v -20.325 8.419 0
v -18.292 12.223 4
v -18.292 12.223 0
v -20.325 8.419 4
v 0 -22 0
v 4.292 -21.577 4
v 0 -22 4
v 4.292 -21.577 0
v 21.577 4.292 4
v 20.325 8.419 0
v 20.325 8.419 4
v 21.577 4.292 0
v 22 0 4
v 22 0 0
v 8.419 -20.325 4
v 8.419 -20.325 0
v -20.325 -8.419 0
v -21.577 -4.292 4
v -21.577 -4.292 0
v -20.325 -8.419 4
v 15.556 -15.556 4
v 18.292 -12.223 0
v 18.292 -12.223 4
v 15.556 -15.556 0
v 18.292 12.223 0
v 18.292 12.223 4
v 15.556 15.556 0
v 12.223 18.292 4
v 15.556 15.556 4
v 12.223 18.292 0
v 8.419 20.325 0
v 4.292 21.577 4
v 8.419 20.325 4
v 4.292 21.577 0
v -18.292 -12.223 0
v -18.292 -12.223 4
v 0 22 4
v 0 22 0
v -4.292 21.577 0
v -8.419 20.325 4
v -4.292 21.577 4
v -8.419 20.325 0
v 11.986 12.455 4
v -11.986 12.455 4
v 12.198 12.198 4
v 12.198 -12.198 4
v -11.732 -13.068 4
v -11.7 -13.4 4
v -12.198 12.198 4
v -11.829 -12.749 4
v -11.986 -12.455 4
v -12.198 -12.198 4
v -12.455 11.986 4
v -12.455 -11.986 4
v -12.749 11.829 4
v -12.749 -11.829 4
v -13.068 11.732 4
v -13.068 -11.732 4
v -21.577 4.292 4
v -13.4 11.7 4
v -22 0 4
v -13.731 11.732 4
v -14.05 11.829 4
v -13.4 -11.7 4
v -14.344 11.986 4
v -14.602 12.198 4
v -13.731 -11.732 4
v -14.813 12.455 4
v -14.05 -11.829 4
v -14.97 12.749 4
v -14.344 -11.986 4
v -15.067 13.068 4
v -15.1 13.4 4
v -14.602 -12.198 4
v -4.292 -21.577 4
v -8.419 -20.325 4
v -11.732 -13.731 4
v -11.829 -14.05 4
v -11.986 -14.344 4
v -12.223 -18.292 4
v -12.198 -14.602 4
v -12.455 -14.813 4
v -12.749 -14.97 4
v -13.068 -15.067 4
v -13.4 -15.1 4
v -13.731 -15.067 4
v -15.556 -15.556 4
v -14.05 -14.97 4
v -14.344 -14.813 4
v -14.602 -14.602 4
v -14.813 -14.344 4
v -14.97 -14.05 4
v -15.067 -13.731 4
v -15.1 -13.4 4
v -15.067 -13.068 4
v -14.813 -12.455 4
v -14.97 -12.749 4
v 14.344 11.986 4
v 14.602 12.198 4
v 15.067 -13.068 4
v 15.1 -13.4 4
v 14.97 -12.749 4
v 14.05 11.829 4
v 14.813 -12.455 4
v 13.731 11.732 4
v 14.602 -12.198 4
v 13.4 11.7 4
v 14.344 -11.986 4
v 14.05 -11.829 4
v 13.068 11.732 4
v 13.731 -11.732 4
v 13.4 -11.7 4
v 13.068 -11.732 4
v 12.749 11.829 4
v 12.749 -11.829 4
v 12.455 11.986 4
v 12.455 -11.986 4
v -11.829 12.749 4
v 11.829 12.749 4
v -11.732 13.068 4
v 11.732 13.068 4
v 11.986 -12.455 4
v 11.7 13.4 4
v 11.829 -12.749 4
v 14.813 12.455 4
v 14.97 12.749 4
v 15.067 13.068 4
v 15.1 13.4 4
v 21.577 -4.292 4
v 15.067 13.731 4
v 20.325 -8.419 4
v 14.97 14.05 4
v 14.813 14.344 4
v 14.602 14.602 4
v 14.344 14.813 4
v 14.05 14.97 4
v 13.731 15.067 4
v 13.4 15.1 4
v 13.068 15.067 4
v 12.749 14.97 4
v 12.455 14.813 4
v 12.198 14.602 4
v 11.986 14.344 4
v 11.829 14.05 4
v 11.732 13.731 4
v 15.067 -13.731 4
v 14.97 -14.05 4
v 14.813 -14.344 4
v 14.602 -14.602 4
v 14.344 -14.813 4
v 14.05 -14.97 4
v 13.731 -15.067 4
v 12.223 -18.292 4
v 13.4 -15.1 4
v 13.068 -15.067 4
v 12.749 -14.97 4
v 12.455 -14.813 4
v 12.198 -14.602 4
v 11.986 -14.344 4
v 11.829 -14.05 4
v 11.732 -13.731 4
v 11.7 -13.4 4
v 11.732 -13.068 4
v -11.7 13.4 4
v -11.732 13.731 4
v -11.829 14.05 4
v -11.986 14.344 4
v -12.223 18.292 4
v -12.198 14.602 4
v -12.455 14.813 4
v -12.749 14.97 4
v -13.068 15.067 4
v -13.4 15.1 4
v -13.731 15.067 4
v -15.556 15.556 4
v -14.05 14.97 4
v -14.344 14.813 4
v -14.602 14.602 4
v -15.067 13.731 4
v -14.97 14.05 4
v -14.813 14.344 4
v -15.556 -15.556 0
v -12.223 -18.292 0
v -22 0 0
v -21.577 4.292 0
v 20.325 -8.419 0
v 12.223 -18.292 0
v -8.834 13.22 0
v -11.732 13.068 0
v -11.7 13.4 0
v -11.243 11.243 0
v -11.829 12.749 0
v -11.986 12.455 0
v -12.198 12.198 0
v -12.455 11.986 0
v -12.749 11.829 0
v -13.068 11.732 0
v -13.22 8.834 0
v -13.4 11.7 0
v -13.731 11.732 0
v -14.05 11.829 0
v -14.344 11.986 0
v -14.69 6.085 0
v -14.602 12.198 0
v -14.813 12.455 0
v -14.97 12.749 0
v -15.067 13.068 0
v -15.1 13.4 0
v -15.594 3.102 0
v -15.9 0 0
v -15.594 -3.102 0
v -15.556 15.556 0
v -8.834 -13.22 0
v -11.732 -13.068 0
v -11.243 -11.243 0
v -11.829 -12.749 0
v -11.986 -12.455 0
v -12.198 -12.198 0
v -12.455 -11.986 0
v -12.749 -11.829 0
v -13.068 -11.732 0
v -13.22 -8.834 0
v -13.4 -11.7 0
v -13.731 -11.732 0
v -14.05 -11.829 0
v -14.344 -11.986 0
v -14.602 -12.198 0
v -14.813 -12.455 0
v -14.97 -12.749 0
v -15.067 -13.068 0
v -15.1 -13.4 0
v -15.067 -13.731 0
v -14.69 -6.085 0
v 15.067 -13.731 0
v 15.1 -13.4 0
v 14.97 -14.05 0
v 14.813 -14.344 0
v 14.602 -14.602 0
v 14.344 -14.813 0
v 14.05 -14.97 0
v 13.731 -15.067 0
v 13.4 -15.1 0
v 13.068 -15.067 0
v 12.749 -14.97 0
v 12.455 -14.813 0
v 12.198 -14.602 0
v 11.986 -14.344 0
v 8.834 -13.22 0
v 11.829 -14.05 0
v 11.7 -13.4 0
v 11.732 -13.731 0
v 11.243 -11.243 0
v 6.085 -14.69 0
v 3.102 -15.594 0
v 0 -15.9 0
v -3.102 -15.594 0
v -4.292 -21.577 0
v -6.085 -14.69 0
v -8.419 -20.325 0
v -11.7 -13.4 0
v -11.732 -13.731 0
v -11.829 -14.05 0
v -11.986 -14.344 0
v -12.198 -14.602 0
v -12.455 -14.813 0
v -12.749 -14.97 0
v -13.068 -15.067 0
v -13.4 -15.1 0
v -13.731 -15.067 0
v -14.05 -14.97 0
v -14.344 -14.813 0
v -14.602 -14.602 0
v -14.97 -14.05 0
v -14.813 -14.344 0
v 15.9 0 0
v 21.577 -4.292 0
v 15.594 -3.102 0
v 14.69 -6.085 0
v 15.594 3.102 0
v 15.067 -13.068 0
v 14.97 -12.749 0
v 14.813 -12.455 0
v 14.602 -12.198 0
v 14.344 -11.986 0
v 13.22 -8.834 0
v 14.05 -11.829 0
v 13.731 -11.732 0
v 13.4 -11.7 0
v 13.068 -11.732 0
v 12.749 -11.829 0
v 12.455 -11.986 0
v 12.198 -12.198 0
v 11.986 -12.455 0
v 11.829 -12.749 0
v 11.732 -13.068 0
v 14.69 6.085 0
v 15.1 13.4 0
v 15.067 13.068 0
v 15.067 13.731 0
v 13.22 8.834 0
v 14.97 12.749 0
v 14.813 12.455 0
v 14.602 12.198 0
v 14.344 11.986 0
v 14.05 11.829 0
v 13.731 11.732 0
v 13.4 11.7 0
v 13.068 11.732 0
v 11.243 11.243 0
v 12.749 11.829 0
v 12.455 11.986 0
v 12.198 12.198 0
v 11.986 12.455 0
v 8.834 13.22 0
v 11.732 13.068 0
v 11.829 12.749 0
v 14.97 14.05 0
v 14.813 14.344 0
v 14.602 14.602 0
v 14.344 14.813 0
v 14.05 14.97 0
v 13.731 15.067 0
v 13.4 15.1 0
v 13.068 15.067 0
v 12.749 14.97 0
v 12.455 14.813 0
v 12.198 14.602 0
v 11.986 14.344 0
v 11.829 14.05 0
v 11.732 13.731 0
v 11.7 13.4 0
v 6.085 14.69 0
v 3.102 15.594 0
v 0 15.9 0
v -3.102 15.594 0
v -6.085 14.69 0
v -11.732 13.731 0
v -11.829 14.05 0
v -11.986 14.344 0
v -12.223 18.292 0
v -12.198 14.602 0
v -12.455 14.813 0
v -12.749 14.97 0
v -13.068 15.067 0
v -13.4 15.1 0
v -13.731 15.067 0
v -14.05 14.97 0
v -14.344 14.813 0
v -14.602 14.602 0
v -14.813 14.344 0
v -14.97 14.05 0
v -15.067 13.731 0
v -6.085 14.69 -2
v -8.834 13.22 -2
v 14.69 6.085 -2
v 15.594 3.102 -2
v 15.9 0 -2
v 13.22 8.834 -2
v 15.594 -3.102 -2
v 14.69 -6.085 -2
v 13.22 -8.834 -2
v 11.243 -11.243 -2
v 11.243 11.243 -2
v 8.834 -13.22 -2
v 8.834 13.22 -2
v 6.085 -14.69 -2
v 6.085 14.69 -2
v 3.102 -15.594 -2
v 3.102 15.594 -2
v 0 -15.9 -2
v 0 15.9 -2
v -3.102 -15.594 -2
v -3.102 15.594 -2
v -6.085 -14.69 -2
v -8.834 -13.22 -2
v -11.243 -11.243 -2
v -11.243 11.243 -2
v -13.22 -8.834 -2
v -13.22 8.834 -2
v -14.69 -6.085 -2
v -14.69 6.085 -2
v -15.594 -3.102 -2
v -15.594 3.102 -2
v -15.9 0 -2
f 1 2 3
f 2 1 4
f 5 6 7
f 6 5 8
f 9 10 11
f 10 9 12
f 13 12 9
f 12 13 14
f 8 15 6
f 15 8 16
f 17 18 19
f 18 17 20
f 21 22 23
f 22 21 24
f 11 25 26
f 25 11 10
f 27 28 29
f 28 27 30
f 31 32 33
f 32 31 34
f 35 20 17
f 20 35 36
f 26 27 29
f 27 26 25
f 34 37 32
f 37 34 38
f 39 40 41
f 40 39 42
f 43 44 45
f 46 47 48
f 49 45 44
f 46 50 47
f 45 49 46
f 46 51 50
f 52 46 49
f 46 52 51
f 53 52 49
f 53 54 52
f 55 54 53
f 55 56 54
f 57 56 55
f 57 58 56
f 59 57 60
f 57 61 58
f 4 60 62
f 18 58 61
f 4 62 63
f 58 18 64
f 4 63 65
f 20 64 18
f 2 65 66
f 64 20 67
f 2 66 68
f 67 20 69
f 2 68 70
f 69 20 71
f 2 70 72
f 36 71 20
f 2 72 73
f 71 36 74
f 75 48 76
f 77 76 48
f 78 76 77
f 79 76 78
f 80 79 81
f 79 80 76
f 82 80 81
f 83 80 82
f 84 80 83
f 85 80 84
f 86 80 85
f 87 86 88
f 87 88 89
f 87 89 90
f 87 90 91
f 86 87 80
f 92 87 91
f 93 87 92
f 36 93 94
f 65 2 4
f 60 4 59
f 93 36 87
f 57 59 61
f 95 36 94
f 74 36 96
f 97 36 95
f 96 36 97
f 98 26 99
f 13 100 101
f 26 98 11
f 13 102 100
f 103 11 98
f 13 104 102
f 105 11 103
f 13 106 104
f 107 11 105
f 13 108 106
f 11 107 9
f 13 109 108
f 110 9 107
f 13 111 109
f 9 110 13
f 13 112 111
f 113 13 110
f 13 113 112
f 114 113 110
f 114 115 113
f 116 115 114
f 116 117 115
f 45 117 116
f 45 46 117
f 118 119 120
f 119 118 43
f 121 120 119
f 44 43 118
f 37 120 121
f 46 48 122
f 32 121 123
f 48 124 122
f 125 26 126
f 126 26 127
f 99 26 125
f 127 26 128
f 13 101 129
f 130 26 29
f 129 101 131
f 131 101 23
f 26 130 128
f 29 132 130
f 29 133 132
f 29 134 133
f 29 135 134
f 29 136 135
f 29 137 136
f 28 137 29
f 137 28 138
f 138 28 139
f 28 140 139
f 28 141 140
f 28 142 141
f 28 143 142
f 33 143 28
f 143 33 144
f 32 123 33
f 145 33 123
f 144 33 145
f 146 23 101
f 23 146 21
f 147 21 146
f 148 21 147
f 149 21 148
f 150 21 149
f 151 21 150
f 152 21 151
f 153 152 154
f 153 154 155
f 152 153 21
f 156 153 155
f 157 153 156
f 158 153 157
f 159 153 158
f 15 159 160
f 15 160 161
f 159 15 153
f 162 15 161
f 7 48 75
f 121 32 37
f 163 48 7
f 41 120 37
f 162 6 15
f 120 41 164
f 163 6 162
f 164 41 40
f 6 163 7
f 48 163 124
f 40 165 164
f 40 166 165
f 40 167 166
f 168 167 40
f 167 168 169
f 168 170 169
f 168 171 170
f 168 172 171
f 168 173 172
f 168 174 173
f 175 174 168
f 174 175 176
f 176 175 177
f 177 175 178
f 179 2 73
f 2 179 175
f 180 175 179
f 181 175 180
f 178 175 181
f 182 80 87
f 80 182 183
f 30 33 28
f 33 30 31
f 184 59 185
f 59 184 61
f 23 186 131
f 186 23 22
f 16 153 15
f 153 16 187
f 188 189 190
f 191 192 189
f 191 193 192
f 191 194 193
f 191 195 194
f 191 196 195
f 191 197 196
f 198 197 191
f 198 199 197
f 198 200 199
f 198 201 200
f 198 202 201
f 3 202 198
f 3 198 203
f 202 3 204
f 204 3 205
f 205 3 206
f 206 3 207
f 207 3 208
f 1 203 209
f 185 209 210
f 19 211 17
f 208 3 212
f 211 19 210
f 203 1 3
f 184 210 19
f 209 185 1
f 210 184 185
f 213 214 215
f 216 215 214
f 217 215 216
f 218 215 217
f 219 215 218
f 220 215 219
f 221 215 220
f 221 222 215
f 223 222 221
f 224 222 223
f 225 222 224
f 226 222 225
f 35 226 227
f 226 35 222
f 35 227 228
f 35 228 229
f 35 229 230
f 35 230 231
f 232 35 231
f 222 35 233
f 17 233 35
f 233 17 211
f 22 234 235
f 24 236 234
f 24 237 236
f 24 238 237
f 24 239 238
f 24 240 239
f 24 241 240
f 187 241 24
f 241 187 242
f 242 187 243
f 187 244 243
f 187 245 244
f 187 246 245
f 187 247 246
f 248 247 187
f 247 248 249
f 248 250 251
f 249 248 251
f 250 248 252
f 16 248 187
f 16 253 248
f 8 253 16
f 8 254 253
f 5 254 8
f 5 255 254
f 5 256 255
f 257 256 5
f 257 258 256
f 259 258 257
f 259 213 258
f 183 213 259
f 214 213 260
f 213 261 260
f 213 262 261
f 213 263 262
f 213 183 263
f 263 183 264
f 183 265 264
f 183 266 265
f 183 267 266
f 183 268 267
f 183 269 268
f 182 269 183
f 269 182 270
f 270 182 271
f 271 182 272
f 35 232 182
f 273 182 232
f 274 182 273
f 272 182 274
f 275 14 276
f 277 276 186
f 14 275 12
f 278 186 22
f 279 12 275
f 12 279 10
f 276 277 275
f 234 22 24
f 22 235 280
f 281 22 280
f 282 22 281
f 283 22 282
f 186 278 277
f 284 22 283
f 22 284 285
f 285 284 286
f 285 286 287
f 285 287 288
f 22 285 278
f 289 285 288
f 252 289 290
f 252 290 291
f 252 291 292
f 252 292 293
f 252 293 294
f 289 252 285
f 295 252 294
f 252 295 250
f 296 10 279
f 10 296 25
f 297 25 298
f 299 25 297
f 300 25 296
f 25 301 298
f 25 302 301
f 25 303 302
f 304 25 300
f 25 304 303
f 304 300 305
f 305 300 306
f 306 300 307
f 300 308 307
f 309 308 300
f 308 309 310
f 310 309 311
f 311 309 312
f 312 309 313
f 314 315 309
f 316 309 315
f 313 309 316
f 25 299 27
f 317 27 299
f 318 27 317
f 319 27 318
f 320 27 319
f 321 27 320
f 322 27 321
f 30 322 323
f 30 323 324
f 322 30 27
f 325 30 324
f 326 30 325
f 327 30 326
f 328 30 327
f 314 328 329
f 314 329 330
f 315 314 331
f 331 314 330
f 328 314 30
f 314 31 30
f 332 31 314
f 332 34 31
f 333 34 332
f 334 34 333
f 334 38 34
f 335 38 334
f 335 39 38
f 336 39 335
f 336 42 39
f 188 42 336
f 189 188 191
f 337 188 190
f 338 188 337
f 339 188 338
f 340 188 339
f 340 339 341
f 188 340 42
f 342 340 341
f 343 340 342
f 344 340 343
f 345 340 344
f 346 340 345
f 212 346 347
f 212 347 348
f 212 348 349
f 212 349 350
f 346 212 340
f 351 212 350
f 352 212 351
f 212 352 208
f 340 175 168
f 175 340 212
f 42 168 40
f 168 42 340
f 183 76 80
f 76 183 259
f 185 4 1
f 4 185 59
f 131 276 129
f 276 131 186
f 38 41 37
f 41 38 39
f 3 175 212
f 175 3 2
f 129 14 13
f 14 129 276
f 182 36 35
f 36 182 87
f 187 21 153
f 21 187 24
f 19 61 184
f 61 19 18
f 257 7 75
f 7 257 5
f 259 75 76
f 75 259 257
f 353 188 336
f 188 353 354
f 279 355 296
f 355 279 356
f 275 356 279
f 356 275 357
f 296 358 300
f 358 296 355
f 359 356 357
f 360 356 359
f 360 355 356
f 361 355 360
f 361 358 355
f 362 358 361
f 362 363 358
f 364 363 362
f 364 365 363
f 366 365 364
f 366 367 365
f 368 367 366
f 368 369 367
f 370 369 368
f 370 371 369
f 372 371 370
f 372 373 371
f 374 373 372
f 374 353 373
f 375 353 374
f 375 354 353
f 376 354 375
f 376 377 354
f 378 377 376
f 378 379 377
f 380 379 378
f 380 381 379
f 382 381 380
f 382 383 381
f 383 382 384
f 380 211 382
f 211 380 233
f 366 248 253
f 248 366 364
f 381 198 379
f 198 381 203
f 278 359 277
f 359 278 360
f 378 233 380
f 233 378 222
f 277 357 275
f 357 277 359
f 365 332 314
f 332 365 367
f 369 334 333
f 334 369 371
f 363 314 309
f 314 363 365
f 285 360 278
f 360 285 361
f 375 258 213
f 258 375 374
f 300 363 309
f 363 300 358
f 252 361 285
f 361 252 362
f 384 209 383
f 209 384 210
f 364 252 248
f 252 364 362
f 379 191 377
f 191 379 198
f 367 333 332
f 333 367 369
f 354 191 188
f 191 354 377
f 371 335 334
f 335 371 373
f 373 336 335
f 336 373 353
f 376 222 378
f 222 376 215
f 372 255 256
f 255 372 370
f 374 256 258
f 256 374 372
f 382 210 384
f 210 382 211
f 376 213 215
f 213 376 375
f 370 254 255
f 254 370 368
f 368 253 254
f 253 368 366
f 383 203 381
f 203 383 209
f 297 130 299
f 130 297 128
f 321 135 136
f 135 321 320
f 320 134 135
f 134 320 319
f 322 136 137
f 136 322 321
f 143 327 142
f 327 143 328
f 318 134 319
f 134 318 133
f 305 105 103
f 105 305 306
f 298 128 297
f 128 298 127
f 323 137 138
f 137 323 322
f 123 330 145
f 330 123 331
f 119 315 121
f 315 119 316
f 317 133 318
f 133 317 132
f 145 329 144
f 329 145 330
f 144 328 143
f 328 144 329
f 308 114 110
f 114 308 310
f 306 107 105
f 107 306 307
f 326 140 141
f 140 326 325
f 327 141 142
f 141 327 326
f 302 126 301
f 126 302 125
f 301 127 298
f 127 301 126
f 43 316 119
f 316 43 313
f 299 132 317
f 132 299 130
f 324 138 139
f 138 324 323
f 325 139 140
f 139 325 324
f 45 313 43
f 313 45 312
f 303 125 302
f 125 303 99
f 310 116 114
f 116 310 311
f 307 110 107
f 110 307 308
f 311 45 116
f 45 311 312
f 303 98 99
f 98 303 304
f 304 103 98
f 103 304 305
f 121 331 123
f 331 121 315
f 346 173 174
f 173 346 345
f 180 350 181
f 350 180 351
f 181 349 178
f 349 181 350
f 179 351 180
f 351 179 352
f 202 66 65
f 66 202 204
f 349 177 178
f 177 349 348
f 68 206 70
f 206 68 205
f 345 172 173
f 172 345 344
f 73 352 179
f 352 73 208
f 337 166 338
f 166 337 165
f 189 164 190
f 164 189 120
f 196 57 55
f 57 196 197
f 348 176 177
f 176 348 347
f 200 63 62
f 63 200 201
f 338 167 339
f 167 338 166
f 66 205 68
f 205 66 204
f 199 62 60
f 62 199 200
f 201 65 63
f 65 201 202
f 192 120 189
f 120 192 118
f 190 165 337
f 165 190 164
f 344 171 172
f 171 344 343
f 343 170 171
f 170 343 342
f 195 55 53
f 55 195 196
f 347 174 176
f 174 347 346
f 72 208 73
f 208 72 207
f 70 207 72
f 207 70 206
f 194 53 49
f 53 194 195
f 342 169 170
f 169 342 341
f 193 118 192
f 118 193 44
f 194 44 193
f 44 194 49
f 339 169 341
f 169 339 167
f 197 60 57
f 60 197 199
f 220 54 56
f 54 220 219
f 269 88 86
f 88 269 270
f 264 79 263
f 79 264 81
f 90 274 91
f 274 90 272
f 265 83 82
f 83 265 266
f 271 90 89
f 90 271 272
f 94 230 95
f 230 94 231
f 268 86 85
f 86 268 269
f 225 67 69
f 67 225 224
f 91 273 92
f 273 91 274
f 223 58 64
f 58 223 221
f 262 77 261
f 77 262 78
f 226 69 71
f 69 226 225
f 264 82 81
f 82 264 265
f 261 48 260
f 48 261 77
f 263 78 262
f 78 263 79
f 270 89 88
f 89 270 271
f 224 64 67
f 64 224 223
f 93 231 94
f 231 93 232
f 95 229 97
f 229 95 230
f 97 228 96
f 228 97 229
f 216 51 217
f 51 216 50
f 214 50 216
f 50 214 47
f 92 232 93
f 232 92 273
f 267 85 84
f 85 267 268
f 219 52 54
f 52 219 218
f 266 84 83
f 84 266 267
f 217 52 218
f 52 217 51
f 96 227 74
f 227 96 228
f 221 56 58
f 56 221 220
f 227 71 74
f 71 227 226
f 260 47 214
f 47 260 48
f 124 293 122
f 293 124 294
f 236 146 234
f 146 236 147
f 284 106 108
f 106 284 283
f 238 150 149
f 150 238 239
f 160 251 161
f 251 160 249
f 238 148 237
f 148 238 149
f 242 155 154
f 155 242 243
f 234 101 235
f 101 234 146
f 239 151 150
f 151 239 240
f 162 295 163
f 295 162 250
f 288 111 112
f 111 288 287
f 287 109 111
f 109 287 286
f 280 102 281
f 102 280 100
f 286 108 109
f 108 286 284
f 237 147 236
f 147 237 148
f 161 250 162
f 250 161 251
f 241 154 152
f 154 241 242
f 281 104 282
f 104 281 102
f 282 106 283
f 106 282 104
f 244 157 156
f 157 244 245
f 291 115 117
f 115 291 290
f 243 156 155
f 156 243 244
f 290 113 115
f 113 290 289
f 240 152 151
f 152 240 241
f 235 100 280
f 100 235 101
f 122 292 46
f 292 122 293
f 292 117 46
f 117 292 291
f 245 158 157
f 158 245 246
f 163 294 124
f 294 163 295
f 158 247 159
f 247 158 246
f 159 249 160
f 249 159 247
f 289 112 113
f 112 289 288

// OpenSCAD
$fn = 32;

// ----------------------------------------------------------------------
// Retaining cap: 6002 cover, 44 mm, spigot 31.8 mm
// ----------------------------------------------------------------------

// --- parameters (mm) ---
plate_d = 44;             // cover diameter
plate_t = 4;              // cover thickness
boss_d = 31.8;            // spigot that enters the housing
boss_h = 2;               // spigot height
bolt_d = 3.4;             // bolt clearance
bolt_r = 18.95;           // bolt circle radius

module cover() {
  cylinder(h = plate_t, d = plate_d);
}

module spigot() {
  /* sunk 1 mm into the cover; the spigot sets the overall height */
  translate([0, 0, -boss_h]) cylinder(h = boss_h + 1, d = boss_d);
}

difference() {
  union() {
    cover();
    spigot();
  }
  for (i = [0 : 3]) rotate([0, 0, 45 + i * 90]) translate([bolt_r, 0, -boss_h - 1])
    cylinder(h = boss_h + plate_t + 2, d = bolt_d);
}
